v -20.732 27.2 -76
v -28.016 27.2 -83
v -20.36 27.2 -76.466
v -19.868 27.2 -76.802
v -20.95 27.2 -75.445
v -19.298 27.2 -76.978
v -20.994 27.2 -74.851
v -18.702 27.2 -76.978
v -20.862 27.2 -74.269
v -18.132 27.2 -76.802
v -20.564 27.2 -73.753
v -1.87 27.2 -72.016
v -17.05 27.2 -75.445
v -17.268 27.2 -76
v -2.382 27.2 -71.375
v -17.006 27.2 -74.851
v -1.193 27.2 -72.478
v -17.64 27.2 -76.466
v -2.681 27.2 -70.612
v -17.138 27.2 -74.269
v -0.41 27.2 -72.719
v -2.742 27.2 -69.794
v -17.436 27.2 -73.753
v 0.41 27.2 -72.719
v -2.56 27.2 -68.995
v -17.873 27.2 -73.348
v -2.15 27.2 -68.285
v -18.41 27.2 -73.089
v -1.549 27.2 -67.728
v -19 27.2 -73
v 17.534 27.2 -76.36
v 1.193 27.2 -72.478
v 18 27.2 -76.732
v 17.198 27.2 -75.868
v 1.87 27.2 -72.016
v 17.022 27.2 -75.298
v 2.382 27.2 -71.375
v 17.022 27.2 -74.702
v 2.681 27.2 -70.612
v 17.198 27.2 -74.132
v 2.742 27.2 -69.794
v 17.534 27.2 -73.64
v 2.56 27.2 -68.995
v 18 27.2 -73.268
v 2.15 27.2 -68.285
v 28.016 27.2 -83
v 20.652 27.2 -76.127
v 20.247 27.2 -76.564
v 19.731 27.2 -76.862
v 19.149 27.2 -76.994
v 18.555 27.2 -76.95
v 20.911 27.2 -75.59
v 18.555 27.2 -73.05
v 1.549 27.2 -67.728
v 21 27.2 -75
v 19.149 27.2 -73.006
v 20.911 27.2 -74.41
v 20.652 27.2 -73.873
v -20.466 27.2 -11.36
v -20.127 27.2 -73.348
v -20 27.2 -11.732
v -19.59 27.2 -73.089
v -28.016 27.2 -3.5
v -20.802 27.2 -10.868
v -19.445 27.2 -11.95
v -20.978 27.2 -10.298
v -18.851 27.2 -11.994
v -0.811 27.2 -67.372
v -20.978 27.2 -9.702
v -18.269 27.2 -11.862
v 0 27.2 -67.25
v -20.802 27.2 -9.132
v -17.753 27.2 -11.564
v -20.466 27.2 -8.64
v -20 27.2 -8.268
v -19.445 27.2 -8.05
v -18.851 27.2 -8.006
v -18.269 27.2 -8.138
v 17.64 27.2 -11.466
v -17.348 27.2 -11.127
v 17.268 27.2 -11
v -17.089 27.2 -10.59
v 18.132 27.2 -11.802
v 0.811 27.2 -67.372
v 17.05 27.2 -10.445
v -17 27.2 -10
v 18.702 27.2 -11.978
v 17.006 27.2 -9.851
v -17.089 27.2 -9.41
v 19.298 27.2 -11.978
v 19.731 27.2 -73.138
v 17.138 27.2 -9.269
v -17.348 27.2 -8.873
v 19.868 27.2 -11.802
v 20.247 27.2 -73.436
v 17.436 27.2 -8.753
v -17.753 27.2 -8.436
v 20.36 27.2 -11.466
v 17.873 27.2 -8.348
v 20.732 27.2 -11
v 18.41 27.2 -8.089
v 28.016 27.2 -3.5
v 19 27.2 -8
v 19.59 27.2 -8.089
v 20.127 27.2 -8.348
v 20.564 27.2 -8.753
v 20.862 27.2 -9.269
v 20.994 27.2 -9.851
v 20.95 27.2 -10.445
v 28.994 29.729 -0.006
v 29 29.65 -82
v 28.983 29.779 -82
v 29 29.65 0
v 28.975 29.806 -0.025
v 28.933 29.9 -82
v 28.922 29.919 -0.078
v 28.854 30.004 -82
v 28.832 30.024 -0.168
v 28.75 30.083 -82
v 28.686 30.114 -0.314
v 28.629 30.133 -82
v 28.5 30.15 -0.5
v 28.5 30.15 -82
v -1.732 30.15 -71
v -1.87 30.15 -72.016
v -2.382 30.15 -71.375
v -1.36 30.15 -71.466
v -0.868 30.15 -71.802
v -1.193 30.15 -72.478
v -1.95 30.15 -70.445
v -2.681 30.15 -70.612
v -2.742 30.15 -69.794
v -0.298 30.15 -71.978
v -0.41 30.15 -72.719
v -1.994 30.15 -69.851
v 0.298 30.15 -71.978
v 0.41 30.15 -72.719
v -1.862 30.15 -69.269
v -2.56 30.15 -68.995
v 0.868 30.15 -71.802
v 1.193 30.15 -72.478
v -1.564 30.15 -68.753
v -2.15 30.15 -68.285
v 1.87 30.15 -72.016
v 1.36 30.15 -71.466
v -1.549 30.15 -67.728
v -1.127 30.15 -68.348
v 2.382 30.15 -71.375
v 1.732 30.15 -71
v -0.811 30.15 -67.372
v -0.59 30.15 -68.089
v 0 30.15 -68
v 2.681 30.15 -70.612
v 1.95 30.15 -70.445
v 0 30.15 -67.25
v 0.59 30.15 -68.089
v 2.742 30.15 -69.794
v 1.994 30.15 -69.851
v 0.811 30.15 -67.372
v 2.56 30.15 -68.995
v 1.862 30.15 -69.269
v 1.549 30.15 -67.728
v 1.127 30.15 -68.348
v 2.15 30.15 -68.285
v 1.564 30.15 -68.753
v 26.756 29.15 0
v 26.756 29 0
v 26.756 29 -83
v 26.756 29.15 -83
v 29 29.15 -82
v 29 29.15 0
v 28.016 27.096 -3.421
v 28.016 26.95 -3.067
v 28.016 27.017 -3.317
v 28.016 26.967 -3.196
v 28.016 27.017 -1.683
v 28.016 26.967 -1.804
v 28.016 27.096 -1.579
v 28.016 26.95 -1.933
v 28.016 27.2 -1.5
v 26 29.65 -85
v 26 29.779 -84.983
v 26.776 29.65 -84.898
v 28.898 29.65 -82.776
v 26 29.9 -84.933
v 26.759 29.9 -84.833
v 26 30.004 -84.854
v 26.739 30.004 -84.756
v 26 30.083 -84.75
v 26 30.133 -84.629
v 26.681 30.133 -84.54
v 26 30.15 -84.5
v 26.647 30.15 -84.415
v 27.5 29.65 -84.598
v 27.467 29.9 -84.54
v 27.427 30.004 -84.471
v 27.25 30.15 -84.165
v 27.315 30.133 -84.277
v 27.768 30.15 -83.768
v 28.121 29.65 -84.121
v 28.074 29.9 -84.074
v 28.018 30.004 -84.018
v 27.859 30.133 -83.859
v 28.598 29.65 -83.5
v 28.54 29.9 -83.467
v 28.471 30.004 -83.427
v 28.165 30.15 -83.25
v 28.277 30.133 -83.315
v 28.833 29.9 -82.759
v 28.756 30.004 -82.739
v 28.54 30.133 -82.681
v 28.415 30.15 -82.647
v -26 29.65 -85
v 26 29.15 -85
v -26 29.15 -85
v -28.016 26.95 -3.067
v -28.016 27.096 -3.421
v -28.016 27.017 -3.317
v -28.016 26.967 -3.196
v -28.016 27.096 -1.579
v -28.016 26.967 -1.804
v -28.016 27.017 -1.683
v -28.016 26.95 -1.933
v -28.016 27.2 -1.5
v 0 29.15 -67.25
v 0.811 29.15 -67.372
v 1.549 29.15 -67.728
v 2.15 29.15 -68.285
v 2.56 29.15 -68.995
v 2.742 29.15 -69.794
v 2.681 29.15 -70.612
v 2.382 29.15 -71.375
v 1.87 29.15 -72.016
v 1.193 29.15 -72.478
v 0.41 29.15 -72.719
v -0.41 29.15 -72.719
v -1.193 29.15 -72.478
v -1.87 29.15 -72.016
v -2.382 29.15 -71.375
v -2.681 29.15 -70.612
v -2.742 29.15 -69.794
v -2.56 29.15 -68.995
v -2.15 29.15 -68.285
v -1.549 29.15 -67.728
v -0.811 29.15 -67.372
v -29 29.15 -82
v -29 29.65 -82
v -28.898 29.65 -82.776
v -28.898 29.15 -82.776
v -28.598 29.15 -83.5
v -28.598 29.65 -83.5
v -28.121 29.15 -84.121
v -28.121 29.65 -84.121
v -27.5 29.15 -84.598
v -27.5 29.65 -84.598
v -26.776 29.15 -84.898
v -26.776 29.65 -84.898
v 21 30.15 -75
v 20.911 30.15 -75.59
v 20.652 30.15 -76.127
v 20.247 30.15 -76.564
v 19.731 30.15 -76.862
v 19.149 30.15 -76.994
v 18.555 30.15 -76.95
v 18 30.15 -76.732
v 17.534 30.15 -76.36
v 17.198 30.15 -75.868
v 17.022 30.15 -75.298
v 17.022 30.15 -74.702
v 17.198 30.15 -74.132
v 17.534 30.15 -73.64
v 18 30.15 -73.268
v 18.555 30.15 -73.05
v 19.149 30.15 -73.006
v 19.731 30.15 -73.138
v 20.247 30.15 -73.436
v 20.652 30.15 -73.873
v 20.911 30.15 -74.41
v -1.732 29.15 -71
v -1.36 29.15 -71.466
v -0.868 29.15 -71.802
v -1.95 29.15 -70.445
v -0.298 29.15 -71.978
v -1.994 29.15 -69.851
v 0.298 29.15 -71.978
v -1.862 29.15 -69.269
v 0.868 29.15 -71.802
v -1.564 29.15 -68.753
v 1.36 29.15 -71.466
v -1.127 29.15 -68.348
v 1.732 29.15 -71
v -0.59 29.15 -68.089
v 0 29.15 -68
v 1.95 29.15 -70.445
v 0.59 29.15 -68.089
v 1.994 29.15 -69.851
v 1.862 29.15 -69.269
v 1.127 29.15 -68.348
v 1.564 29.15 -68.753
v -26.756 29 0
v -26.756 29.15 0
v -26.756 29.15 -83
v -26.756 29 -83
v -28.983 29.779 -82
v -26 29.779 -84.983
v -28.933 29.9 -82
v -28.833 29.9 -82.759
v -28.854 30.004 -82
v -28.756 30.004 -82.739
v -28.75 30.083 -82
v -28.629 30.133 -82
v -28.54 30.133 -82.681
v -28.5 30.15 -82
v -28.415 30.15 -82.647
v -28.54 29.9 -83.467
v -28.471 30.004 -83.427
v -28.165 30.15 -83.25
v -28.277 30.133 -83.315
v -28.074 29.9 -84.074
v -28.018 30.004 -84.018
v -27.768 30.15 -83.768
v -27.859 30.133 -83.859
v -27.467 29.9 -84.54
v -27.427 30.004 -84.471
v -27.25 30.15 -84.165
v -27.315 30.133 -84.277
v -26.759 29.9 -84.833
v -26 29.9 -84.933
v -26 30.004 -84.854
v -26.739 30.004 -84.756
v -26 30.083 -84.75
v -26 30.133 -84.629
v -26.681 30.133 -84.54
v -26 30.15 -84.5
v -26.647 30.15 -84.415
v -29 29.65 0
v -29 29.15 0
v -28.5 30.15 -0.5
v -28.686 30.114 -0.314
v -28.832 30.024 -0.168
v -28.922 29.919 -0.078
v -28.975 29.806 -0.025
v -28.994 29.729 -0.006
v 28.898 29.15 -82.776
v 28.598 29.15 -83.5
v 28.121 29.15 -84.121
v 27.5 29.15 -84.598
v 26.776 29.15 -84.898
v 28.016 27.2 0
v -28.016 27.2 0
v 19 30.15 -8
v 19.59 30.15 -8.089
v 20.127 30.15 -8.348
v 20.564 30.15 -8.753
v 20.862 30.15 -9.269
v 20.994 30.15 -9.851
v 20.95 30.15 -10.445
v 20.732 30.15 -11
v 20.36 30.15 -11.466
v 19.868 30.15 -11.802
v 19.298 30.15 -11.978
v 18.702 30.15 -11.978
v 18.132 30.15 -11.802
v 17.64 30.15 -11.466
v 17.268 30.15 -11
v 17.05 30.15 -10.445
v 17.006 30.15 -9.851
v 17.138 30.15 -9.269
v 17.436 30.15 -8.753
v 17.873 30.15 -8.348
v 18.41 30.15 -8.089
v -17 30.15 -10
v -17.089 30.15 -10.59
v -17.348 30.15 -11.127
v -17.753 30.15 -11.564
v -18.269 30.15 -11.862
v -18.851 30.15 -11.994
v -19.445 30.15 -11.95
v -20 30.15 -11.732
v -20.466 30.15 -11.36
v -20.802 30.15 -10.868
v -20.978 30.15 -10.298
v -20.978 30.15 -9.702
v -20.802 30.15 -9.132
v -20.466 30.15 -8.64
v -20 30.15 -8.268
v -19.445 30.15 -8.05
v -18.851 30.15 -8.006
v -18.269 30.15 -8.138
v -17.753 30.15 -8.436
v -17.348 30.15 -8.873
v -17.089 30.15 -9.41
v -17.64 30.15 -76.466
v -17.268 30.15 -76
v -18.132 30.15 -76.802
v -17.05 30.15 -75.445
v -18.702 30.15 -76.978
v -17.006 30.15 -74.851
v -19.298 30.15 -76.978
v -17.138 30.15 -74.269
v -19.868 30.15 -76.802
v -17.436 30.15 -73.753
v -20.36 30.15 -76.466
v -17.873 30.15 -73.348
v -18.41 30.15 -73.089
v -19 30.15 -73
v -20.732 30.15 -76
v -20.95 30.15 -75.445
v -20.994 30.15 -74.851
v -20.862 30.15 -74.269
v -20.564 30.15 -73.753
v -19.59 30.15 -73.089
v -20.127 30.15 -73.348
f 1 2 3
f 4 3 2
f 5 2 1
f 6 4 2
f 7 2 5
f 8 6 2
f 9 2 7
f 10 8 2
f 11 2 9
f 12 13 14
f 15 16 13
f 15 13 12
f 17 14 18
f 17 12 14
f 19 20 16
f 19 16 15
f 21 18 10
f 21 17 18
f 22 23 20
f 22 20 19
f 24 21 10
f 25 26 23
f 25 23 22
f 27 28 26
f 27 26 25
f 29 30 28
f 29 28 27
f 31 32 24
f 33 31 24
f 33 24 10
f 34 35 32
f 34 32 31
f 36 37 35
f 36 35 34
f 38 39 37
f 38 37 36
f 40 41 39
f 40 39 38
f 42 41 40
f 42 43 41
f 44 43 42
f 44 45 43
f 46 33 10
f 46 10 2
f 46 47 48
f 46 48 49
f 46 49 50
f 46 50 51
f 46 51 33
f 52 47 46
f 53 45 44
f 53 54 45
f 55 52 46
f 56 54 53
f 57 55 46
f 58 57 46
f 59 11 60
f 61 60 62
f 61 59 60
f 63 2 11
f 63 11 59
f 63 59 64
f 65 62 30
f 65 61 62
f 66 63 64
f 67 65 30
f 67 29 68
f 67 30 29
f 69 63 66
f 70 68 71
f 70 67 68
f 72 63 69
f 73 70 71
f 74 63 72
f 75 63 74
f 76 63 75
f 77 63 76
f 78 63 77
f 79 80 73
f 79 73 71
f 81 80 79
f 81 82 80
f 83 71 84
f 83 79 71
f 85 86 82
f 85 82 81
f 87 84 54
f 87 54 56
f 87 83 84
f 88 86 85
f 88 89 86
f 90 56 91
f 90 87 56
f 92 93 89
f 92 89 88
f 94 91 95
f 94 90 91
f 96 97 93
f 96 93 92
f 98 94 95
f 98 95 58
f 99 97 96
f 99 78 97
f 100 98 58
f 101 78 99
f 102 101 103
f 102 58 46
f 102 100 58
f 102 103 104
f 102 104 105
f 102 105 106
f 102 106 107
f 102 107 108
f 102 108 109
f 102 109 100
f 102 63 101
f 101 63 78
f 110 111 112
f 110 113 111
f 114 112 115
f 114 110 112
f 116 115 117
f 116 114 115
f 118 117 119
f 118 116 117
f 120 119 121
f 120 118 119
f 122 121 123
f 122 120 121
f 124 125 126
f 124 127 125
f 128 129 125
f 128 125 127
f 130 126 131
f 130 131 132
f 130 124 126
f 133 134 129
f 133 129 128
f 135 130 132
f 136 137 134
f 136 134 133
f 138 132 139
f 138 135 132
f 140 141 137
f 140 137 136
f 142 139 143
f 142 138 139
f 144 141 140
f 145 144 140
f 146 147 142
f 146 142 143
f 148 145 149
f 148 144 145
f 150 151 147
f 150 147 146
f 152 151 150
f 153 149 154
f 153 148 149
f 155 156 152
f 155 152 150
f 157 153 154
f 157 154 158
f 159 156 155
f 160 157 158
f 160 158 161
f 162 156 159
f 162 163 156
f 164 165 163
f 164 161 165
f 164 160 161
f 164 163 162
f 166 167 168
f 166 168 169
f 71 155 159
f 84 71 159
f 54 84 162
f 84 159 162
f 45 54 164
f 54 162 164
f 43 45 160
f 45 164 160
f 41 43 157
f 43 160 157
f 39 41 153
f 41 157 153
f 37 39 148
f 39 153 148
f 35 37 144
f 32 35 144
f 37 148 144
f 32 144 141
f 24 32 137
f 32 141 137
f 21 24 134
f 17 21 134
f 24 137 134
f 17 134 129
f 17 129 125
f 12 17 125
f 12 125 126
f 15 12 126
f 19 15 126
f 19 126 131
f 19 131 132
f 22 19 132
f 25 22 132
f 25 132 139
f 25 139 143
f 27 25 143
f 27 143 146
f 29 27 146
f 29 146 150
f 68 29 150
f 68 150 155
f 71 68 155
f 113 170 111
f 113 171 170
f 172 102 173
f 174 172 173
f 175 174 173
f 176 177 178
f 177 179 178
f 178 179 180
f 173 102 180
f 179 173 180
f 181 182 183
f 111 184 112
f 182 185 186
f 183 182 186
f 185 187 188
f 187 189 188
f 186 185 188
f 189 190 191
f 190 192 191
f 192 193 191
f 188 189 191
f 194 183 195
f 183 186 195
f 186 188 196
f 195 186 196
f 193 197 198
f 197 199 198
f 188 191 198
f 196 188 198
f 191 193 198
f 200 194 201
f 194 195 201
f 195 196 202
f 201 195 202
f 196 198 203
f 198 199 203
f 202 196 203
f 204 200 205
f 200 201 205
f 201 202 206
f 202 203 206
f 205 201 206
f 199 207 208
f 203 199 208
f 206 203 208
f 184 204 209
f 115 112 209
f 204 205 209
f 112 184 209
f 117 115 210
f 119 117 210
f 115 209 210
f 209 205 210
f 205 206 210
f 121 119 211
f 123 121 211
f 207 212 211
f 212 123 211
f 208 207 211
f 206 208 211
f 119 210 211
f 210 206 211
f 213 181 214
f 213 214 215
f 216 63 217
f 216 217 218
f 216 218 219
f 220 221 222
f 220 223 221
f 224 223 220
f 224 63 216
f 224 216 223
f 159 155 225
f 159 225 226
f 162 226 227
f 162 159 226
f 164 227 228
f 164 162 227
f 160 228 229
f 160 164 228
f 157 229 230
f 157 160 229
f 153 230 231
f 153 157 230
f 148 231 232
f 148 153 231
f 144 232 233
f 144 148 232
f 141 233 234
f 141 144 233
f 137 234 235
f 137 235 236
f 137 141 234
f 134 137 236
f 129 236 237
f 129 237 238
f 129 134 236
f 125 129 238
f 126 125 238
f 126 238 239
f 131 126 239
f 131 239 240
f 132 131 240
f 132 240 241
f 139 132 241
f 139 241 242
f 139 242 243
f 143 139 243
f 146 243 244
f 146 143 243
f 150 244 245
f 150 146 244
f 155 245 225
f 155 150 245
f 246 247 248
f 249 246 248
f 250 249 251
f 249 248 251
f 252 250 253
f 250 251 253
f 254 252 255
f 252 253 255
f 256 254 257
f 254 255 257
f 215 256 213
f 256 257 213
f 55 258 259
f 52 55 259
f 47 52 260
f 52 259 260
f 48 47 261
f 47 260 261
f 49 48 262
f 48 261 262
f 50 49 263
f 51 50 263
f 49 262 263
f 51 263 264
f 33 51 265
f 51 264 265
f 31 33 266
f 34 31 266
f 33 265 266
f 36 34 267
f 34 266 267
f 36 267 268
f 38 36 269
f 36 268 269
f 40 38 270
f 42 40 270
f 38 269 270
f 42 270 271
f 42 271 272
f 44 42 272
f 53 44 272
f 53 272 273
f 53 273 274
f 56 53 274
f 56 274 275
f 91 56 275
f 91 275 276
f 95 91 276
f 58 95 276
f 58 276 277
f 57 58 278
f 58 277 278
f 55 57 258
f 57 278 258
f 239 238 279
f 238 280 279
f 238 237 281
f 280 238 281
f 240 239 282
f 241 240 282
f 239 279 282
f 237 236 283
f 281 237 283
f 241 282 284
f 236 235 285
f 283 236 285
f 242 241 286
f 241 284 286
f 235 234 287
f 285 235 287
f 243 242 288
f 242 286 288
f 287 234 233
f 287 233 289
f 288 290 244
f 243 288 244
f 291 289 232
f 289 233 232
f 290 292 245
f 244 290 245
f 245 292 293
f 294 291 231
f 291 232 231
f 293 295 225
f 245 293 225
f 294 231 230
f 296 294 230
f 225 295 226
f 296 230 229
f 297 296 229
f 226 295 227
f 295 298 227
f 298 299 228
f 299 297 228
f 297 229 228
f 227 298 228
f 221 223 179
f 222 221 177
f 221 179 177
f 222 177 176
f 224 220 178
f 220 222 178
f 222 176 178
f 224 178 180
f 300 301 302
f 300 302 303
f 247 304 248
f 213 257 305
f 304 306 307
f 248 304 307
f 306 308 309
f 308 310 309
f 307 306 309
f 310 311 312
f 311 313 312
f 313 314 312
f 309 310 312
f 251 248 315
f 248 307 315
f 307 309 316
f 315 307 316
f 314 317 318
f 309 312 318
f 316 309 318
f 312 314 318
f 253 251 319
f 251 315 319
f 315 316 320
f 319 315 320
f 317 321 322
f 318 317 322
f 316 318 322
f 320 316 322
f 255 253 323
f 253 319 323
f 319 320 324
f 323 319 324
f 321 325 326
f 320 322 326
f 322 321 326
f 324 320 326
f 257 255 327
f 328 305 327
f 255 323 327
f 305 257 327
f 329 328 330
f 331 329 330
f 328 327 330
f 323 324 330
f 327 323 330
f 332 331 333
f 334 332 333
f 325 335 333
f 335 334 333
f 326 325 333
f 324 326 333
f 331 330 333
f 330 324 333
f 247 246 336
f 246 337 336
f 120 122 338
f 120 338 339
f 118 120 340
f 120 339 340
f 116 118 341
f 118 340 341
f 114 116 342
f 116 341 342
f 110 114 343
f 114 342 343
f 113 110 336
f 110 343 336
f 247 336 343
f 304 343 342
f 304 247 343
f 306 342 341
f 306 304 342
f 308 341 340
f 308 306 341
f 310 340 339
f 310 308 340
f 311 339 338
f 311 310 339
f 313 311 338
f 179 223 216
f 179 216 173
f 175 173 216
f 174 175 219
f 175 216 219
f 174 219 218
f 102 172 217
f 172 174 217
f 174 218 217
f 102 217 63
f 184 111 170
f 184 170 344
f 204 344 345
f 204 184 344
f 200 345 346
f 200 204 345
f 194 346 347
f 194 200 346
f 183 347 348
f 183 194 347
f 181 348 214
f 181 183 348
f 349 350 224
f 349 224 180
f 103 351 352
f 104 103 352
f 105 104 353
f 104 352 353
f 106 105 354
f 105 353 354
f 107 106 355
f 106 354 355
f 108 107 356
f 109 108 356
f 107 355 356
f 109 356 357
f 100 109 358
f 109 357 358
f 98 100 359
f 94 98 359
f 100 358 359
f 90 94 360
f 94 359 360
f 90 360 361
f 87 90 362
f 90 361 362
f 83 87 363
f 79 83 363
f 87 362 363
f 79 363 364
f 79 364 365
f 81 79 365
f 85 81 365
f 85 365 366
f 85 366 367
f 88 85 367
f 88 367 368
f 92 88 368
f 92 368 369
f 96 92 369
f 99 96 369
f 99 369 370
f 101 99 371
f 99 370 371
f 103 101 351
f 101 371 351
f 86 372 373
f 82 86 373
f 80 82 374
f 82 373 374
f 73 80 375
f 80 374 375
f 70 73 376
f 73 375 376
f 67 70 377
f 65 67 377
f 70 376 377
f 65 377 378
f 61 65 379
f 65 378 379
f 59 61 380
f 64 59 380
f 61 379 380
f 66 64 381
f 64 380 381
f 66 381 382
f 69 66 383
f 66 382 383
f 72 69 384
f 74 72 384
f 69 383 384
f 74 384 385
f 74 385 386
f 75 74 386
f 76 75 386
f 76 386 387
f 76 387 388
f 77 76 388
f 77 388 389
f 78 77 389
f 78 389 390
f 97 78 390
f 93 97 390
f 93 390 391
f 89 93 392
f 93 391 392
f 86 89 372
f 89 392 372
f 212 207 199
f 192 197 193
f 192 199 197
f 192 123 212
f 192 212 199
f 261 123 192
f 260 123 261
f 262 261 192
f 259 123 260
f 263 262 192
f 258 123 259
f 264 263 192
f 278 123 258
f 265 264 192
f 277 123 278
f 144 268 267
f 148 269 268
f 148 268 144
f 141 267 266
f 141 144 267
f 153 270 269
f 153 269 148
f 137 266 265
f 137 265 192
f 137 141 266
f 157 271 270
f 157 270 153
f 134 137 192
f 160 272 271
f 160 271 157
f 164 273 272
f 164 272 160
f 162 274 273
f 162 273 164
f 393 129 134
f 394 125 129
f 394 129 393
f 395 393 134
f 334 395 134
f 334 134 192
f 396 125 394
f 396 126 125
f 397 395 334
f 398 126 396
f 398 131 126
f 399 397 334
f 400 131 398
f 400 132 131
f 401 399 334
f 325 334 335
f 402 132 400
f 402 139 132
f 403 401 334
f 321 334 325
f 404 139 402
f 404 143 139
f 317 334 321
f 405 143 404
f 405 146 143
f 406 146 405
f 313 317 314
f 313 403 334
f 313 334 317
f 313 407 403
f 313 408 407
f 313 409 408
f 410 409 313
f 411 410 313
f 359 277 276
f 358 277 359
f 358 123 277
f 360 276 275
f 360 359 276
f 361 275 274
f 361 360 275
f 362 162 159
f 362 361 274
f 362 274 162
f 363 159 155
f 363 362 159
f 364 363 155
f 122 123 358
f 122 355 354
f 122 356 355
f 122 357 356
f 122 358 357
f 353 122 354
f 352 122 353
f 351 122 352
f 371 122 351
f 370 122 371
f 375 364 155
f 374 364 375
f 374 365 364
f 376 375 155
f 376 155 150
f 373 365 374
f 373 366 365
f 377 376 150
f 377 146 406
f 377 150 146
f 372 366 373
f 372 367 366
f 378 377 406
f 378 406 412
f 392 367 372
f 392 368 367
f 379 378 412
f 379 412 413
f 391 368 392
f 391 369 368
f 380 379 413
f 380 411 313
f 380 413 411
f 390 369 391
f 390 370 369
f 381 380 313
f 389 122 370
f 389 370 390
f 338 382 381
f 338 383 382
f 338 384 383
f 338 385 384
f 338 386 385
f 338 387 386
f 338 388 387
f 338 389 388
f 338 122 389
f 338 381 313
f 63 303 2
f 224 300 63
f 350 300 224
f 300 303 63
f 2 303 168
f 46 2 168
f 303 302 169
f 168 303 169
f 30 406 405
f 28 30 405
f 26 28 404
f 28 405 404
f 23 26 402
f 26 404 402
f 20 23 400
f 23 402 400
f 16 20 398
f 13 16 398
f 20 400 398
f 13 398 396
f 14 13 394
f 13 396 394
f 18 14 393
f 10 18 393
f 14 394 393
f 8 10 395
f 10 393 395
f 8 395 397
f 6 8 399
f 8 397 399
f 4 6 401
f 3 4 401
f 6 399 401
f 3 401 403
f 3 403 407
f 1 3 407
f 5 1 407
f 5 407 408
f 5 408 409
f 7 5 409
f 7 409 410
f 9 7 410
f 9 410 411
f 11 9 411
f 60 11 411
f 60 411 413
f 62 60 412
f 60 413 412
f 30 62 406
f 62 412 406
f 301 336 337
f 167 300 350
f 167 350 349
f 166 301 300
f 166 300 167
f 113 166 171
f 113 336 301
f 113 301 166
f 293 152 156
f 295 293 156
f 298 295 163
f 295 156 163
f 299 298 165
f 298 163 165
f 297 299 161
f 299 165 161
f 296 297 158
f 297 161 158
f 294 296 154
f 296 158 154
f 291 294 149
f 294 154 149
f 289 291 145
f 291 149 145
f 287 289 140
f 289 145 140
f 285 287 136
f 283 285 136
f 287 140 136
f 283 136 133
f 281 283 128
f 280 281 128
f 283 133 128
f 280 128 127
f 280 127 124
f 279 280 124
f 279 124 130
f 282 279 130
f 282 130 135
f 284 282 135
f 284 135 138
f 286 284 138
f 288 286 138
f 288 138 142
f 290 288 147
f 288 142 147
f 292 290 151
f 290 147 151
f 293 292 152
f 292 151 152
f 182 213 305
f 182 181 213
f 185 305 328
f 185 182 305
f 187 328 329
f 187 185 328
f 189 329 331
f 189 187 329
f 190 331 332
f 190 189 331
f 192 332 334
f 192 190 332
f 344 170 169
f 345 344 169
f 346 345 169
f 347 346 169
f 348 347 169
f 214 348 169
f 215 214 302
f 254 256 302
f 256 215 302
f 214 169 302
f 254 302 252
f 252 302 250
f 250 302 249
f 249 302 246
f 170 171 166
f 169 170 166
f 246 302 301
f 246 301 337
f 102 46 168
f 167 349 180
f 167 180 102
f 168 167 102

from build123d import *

# Parameters (mm, degrees)
BOSS_EXTRUDE1_DEPTH = 83
SKETCH3_W           = 58
SKETCH3_H           = 1
BOSS_EXTRUDE2_DEPTH = 2
FILLET1_R           = 3
SKETCH4_W           = 56.032437302
SKETCH4_H           = 2
BOSS_EXTRUDE3_DEPTH = 0.25
FILLET2_R           = 0.5
CUT_EXTRUDE1_REACH  = 91.868
SKETCH5_R           = 2.75
SKETCH6_R           = 2.75
SKETCH6_R_2         = 2
BOSS_EXTRUDE4_DEPTH = 1
SKETCH7_R           = 2
CUT_EXTRUDE2_DEPTH  = 2.95
FILLET3_R           = 0.5


with BuildPart() as part:
    # Sketch1 → Boss-Extrude1 (new body)
    with BuildSketch(Plane.XY):
        Polygon((-26.755845082, 29), (-28.016218651, 27.2), (28.016218651, 27.2), (26.755845082, 29), (26.755845082, 29.15), (29, 29.15), (29, 30.15), (-29, 30.15), (-29, 29.15), (-26.755845082, 29.15), align=None)
    extrude(amount=-BOSS_EXTRUDE1_DEPTH)

    # Sketch3 → Boss-Extrude2 (add)
    with BuildSketch(Plane(origin=(0, 0, -83), x_dir=(-1, 0, 0), z_dir=(0, 0, -1))):
        with Locations((0, 29.65)):
            Rectangle(SKETCH3_W, SKETCH3_H)
    extrude(amount=BOSS_EXTRUDE2_DEPTH)

    # Fillet1
    fillet1_edges = [part.edges().sort_by_distance(p)[0] for p in [
        (-29, 29.65, -85),
        (29, 29.65, -85),
    ]]
    fillet(fillet1_edges, radius=FILLET1_R)

    # Sketch4 → Boss-Extrude3 (add)
    with BuildSketch(Plane.XZ.offset(-27.2)):
        with Locations((0, -2.5)):
            Rectangle(SKETCH4_W, SKETCH4_H)
    extrude(amount=BOSS_EXTRUDE3_DEPTH)

    # Fillet2
    # the kernel refuses this fillet: 0.5 mm, written as the material it takes off along each edge
    with BuildSketch(Plane(origin=(-29.098750406, 26.95, -3.5), x_dir=(0, 1, 0), z_dir=(1, 0, 0)), Plane(origin=(29.098750406, 26.95, -1.5), x_dir=(0, 1, 0), z_dir=(-1, 0, 0))) as fillet2_piece_1:
        with BuildLine():
            CenterArc((0.5, 0.433012702), FILLET2_R, 180, 60)
            Line((0, 0.433012702), (-0.01, 0.433012702))
            Line((-0.01, 0.433012702), (-0.01, 0))
            Line((-0.01, 0), (0, -0.01))
            ThreePointArc((0, -0.01), (0.125, -0.01), (0.245, -0.008660254))
            Line((0.245, -0.008660254), (0.25, 0))
        make_face()
    extrude(amount=58.197500812, mode=Mode.SUBTRACT)

    # Sketch5 → Cut-Extrude1 (cut, up to next)
    with BuildSketch(Plane(origin=(0, 30.15, 0), x_dir=(1, 0, 0), z_dir=(0, 1, 0)), mode=Mode.PRIVATE) as cut_extrude1_sk1:
        with Locations(Location((0, 70, 0), (0, 0, 270))):
            Circle(SKETCH5_R)
    cut_extrude1_tool1 = extrude(cut_extrude1_sk1.sketch, amount=-CUT_EXTRUDE1_REACH, mode=Mode.PRIVATE) & part.part
    add(cut_extrude1_tool1.solids().sort_by_distance((0, 30.15, -70))[0], mode=Mode.SUBTRACT)

    # Sketch7 → Cut-Extrude2 (cut)
    with BuildSketch(Plane(origin=(0, 30.15, 0), x_dir=(1, 0, 0), z_dir=(0, 1, 0))):
        with Locations(Location((19, 10, 0), (0, 0, 270))):
            Circle(SKETCH7_R)
        with Locations((19, 75)):
            Circle(SKETCH7_R)
        with Locations(Location((-19, 75, 0), (0, 0, 270))):
            Circle(SKETCH7_R)
        with Locations((-19, 10)):
            Circle(SKETCH7_R)
    extrude(amount=-CUT_EXTRUDE2_DEPTH, mode=Mode.SUBTRACT)

    # Fillet3
    fillet3_edges = [part.edges().sort_by_distance(p)[0] for p in [
        (0, 30.15, 0),
        (29, 30.15, -41),
        (0, 30.15, -85),
        (-29, 30.15, -41),
        (-28.121320344, 30.15, -84.121320344),
        (28.121320344, 30.15, -84.121320344),
    ]]
    fillet(fillet3_edges, radius=FILLET3_R)


with BuildPart() as body_2:
    # Sketch6 → Boss-Extrude4 (new body)
    with BuildSketch(Plane(origin=(0, 30.15, 0), x_dir=(1, 0, 0), z_dir=(0, 1, 0))):
        with Locations(Location((0, 70, 0), (0, 0, 270))):
            Circle(SKETCH6_R)
        with Locations(Location((0, 70, 0), (0, 0, 270))):
            Circle(SKETCH6_R_2, mode=Mode.SUBTRACT)
    extrude(amount=-BOSS_EXTRUDE4_DEPTH)


solid = Compound([part.part, body_2.part])
